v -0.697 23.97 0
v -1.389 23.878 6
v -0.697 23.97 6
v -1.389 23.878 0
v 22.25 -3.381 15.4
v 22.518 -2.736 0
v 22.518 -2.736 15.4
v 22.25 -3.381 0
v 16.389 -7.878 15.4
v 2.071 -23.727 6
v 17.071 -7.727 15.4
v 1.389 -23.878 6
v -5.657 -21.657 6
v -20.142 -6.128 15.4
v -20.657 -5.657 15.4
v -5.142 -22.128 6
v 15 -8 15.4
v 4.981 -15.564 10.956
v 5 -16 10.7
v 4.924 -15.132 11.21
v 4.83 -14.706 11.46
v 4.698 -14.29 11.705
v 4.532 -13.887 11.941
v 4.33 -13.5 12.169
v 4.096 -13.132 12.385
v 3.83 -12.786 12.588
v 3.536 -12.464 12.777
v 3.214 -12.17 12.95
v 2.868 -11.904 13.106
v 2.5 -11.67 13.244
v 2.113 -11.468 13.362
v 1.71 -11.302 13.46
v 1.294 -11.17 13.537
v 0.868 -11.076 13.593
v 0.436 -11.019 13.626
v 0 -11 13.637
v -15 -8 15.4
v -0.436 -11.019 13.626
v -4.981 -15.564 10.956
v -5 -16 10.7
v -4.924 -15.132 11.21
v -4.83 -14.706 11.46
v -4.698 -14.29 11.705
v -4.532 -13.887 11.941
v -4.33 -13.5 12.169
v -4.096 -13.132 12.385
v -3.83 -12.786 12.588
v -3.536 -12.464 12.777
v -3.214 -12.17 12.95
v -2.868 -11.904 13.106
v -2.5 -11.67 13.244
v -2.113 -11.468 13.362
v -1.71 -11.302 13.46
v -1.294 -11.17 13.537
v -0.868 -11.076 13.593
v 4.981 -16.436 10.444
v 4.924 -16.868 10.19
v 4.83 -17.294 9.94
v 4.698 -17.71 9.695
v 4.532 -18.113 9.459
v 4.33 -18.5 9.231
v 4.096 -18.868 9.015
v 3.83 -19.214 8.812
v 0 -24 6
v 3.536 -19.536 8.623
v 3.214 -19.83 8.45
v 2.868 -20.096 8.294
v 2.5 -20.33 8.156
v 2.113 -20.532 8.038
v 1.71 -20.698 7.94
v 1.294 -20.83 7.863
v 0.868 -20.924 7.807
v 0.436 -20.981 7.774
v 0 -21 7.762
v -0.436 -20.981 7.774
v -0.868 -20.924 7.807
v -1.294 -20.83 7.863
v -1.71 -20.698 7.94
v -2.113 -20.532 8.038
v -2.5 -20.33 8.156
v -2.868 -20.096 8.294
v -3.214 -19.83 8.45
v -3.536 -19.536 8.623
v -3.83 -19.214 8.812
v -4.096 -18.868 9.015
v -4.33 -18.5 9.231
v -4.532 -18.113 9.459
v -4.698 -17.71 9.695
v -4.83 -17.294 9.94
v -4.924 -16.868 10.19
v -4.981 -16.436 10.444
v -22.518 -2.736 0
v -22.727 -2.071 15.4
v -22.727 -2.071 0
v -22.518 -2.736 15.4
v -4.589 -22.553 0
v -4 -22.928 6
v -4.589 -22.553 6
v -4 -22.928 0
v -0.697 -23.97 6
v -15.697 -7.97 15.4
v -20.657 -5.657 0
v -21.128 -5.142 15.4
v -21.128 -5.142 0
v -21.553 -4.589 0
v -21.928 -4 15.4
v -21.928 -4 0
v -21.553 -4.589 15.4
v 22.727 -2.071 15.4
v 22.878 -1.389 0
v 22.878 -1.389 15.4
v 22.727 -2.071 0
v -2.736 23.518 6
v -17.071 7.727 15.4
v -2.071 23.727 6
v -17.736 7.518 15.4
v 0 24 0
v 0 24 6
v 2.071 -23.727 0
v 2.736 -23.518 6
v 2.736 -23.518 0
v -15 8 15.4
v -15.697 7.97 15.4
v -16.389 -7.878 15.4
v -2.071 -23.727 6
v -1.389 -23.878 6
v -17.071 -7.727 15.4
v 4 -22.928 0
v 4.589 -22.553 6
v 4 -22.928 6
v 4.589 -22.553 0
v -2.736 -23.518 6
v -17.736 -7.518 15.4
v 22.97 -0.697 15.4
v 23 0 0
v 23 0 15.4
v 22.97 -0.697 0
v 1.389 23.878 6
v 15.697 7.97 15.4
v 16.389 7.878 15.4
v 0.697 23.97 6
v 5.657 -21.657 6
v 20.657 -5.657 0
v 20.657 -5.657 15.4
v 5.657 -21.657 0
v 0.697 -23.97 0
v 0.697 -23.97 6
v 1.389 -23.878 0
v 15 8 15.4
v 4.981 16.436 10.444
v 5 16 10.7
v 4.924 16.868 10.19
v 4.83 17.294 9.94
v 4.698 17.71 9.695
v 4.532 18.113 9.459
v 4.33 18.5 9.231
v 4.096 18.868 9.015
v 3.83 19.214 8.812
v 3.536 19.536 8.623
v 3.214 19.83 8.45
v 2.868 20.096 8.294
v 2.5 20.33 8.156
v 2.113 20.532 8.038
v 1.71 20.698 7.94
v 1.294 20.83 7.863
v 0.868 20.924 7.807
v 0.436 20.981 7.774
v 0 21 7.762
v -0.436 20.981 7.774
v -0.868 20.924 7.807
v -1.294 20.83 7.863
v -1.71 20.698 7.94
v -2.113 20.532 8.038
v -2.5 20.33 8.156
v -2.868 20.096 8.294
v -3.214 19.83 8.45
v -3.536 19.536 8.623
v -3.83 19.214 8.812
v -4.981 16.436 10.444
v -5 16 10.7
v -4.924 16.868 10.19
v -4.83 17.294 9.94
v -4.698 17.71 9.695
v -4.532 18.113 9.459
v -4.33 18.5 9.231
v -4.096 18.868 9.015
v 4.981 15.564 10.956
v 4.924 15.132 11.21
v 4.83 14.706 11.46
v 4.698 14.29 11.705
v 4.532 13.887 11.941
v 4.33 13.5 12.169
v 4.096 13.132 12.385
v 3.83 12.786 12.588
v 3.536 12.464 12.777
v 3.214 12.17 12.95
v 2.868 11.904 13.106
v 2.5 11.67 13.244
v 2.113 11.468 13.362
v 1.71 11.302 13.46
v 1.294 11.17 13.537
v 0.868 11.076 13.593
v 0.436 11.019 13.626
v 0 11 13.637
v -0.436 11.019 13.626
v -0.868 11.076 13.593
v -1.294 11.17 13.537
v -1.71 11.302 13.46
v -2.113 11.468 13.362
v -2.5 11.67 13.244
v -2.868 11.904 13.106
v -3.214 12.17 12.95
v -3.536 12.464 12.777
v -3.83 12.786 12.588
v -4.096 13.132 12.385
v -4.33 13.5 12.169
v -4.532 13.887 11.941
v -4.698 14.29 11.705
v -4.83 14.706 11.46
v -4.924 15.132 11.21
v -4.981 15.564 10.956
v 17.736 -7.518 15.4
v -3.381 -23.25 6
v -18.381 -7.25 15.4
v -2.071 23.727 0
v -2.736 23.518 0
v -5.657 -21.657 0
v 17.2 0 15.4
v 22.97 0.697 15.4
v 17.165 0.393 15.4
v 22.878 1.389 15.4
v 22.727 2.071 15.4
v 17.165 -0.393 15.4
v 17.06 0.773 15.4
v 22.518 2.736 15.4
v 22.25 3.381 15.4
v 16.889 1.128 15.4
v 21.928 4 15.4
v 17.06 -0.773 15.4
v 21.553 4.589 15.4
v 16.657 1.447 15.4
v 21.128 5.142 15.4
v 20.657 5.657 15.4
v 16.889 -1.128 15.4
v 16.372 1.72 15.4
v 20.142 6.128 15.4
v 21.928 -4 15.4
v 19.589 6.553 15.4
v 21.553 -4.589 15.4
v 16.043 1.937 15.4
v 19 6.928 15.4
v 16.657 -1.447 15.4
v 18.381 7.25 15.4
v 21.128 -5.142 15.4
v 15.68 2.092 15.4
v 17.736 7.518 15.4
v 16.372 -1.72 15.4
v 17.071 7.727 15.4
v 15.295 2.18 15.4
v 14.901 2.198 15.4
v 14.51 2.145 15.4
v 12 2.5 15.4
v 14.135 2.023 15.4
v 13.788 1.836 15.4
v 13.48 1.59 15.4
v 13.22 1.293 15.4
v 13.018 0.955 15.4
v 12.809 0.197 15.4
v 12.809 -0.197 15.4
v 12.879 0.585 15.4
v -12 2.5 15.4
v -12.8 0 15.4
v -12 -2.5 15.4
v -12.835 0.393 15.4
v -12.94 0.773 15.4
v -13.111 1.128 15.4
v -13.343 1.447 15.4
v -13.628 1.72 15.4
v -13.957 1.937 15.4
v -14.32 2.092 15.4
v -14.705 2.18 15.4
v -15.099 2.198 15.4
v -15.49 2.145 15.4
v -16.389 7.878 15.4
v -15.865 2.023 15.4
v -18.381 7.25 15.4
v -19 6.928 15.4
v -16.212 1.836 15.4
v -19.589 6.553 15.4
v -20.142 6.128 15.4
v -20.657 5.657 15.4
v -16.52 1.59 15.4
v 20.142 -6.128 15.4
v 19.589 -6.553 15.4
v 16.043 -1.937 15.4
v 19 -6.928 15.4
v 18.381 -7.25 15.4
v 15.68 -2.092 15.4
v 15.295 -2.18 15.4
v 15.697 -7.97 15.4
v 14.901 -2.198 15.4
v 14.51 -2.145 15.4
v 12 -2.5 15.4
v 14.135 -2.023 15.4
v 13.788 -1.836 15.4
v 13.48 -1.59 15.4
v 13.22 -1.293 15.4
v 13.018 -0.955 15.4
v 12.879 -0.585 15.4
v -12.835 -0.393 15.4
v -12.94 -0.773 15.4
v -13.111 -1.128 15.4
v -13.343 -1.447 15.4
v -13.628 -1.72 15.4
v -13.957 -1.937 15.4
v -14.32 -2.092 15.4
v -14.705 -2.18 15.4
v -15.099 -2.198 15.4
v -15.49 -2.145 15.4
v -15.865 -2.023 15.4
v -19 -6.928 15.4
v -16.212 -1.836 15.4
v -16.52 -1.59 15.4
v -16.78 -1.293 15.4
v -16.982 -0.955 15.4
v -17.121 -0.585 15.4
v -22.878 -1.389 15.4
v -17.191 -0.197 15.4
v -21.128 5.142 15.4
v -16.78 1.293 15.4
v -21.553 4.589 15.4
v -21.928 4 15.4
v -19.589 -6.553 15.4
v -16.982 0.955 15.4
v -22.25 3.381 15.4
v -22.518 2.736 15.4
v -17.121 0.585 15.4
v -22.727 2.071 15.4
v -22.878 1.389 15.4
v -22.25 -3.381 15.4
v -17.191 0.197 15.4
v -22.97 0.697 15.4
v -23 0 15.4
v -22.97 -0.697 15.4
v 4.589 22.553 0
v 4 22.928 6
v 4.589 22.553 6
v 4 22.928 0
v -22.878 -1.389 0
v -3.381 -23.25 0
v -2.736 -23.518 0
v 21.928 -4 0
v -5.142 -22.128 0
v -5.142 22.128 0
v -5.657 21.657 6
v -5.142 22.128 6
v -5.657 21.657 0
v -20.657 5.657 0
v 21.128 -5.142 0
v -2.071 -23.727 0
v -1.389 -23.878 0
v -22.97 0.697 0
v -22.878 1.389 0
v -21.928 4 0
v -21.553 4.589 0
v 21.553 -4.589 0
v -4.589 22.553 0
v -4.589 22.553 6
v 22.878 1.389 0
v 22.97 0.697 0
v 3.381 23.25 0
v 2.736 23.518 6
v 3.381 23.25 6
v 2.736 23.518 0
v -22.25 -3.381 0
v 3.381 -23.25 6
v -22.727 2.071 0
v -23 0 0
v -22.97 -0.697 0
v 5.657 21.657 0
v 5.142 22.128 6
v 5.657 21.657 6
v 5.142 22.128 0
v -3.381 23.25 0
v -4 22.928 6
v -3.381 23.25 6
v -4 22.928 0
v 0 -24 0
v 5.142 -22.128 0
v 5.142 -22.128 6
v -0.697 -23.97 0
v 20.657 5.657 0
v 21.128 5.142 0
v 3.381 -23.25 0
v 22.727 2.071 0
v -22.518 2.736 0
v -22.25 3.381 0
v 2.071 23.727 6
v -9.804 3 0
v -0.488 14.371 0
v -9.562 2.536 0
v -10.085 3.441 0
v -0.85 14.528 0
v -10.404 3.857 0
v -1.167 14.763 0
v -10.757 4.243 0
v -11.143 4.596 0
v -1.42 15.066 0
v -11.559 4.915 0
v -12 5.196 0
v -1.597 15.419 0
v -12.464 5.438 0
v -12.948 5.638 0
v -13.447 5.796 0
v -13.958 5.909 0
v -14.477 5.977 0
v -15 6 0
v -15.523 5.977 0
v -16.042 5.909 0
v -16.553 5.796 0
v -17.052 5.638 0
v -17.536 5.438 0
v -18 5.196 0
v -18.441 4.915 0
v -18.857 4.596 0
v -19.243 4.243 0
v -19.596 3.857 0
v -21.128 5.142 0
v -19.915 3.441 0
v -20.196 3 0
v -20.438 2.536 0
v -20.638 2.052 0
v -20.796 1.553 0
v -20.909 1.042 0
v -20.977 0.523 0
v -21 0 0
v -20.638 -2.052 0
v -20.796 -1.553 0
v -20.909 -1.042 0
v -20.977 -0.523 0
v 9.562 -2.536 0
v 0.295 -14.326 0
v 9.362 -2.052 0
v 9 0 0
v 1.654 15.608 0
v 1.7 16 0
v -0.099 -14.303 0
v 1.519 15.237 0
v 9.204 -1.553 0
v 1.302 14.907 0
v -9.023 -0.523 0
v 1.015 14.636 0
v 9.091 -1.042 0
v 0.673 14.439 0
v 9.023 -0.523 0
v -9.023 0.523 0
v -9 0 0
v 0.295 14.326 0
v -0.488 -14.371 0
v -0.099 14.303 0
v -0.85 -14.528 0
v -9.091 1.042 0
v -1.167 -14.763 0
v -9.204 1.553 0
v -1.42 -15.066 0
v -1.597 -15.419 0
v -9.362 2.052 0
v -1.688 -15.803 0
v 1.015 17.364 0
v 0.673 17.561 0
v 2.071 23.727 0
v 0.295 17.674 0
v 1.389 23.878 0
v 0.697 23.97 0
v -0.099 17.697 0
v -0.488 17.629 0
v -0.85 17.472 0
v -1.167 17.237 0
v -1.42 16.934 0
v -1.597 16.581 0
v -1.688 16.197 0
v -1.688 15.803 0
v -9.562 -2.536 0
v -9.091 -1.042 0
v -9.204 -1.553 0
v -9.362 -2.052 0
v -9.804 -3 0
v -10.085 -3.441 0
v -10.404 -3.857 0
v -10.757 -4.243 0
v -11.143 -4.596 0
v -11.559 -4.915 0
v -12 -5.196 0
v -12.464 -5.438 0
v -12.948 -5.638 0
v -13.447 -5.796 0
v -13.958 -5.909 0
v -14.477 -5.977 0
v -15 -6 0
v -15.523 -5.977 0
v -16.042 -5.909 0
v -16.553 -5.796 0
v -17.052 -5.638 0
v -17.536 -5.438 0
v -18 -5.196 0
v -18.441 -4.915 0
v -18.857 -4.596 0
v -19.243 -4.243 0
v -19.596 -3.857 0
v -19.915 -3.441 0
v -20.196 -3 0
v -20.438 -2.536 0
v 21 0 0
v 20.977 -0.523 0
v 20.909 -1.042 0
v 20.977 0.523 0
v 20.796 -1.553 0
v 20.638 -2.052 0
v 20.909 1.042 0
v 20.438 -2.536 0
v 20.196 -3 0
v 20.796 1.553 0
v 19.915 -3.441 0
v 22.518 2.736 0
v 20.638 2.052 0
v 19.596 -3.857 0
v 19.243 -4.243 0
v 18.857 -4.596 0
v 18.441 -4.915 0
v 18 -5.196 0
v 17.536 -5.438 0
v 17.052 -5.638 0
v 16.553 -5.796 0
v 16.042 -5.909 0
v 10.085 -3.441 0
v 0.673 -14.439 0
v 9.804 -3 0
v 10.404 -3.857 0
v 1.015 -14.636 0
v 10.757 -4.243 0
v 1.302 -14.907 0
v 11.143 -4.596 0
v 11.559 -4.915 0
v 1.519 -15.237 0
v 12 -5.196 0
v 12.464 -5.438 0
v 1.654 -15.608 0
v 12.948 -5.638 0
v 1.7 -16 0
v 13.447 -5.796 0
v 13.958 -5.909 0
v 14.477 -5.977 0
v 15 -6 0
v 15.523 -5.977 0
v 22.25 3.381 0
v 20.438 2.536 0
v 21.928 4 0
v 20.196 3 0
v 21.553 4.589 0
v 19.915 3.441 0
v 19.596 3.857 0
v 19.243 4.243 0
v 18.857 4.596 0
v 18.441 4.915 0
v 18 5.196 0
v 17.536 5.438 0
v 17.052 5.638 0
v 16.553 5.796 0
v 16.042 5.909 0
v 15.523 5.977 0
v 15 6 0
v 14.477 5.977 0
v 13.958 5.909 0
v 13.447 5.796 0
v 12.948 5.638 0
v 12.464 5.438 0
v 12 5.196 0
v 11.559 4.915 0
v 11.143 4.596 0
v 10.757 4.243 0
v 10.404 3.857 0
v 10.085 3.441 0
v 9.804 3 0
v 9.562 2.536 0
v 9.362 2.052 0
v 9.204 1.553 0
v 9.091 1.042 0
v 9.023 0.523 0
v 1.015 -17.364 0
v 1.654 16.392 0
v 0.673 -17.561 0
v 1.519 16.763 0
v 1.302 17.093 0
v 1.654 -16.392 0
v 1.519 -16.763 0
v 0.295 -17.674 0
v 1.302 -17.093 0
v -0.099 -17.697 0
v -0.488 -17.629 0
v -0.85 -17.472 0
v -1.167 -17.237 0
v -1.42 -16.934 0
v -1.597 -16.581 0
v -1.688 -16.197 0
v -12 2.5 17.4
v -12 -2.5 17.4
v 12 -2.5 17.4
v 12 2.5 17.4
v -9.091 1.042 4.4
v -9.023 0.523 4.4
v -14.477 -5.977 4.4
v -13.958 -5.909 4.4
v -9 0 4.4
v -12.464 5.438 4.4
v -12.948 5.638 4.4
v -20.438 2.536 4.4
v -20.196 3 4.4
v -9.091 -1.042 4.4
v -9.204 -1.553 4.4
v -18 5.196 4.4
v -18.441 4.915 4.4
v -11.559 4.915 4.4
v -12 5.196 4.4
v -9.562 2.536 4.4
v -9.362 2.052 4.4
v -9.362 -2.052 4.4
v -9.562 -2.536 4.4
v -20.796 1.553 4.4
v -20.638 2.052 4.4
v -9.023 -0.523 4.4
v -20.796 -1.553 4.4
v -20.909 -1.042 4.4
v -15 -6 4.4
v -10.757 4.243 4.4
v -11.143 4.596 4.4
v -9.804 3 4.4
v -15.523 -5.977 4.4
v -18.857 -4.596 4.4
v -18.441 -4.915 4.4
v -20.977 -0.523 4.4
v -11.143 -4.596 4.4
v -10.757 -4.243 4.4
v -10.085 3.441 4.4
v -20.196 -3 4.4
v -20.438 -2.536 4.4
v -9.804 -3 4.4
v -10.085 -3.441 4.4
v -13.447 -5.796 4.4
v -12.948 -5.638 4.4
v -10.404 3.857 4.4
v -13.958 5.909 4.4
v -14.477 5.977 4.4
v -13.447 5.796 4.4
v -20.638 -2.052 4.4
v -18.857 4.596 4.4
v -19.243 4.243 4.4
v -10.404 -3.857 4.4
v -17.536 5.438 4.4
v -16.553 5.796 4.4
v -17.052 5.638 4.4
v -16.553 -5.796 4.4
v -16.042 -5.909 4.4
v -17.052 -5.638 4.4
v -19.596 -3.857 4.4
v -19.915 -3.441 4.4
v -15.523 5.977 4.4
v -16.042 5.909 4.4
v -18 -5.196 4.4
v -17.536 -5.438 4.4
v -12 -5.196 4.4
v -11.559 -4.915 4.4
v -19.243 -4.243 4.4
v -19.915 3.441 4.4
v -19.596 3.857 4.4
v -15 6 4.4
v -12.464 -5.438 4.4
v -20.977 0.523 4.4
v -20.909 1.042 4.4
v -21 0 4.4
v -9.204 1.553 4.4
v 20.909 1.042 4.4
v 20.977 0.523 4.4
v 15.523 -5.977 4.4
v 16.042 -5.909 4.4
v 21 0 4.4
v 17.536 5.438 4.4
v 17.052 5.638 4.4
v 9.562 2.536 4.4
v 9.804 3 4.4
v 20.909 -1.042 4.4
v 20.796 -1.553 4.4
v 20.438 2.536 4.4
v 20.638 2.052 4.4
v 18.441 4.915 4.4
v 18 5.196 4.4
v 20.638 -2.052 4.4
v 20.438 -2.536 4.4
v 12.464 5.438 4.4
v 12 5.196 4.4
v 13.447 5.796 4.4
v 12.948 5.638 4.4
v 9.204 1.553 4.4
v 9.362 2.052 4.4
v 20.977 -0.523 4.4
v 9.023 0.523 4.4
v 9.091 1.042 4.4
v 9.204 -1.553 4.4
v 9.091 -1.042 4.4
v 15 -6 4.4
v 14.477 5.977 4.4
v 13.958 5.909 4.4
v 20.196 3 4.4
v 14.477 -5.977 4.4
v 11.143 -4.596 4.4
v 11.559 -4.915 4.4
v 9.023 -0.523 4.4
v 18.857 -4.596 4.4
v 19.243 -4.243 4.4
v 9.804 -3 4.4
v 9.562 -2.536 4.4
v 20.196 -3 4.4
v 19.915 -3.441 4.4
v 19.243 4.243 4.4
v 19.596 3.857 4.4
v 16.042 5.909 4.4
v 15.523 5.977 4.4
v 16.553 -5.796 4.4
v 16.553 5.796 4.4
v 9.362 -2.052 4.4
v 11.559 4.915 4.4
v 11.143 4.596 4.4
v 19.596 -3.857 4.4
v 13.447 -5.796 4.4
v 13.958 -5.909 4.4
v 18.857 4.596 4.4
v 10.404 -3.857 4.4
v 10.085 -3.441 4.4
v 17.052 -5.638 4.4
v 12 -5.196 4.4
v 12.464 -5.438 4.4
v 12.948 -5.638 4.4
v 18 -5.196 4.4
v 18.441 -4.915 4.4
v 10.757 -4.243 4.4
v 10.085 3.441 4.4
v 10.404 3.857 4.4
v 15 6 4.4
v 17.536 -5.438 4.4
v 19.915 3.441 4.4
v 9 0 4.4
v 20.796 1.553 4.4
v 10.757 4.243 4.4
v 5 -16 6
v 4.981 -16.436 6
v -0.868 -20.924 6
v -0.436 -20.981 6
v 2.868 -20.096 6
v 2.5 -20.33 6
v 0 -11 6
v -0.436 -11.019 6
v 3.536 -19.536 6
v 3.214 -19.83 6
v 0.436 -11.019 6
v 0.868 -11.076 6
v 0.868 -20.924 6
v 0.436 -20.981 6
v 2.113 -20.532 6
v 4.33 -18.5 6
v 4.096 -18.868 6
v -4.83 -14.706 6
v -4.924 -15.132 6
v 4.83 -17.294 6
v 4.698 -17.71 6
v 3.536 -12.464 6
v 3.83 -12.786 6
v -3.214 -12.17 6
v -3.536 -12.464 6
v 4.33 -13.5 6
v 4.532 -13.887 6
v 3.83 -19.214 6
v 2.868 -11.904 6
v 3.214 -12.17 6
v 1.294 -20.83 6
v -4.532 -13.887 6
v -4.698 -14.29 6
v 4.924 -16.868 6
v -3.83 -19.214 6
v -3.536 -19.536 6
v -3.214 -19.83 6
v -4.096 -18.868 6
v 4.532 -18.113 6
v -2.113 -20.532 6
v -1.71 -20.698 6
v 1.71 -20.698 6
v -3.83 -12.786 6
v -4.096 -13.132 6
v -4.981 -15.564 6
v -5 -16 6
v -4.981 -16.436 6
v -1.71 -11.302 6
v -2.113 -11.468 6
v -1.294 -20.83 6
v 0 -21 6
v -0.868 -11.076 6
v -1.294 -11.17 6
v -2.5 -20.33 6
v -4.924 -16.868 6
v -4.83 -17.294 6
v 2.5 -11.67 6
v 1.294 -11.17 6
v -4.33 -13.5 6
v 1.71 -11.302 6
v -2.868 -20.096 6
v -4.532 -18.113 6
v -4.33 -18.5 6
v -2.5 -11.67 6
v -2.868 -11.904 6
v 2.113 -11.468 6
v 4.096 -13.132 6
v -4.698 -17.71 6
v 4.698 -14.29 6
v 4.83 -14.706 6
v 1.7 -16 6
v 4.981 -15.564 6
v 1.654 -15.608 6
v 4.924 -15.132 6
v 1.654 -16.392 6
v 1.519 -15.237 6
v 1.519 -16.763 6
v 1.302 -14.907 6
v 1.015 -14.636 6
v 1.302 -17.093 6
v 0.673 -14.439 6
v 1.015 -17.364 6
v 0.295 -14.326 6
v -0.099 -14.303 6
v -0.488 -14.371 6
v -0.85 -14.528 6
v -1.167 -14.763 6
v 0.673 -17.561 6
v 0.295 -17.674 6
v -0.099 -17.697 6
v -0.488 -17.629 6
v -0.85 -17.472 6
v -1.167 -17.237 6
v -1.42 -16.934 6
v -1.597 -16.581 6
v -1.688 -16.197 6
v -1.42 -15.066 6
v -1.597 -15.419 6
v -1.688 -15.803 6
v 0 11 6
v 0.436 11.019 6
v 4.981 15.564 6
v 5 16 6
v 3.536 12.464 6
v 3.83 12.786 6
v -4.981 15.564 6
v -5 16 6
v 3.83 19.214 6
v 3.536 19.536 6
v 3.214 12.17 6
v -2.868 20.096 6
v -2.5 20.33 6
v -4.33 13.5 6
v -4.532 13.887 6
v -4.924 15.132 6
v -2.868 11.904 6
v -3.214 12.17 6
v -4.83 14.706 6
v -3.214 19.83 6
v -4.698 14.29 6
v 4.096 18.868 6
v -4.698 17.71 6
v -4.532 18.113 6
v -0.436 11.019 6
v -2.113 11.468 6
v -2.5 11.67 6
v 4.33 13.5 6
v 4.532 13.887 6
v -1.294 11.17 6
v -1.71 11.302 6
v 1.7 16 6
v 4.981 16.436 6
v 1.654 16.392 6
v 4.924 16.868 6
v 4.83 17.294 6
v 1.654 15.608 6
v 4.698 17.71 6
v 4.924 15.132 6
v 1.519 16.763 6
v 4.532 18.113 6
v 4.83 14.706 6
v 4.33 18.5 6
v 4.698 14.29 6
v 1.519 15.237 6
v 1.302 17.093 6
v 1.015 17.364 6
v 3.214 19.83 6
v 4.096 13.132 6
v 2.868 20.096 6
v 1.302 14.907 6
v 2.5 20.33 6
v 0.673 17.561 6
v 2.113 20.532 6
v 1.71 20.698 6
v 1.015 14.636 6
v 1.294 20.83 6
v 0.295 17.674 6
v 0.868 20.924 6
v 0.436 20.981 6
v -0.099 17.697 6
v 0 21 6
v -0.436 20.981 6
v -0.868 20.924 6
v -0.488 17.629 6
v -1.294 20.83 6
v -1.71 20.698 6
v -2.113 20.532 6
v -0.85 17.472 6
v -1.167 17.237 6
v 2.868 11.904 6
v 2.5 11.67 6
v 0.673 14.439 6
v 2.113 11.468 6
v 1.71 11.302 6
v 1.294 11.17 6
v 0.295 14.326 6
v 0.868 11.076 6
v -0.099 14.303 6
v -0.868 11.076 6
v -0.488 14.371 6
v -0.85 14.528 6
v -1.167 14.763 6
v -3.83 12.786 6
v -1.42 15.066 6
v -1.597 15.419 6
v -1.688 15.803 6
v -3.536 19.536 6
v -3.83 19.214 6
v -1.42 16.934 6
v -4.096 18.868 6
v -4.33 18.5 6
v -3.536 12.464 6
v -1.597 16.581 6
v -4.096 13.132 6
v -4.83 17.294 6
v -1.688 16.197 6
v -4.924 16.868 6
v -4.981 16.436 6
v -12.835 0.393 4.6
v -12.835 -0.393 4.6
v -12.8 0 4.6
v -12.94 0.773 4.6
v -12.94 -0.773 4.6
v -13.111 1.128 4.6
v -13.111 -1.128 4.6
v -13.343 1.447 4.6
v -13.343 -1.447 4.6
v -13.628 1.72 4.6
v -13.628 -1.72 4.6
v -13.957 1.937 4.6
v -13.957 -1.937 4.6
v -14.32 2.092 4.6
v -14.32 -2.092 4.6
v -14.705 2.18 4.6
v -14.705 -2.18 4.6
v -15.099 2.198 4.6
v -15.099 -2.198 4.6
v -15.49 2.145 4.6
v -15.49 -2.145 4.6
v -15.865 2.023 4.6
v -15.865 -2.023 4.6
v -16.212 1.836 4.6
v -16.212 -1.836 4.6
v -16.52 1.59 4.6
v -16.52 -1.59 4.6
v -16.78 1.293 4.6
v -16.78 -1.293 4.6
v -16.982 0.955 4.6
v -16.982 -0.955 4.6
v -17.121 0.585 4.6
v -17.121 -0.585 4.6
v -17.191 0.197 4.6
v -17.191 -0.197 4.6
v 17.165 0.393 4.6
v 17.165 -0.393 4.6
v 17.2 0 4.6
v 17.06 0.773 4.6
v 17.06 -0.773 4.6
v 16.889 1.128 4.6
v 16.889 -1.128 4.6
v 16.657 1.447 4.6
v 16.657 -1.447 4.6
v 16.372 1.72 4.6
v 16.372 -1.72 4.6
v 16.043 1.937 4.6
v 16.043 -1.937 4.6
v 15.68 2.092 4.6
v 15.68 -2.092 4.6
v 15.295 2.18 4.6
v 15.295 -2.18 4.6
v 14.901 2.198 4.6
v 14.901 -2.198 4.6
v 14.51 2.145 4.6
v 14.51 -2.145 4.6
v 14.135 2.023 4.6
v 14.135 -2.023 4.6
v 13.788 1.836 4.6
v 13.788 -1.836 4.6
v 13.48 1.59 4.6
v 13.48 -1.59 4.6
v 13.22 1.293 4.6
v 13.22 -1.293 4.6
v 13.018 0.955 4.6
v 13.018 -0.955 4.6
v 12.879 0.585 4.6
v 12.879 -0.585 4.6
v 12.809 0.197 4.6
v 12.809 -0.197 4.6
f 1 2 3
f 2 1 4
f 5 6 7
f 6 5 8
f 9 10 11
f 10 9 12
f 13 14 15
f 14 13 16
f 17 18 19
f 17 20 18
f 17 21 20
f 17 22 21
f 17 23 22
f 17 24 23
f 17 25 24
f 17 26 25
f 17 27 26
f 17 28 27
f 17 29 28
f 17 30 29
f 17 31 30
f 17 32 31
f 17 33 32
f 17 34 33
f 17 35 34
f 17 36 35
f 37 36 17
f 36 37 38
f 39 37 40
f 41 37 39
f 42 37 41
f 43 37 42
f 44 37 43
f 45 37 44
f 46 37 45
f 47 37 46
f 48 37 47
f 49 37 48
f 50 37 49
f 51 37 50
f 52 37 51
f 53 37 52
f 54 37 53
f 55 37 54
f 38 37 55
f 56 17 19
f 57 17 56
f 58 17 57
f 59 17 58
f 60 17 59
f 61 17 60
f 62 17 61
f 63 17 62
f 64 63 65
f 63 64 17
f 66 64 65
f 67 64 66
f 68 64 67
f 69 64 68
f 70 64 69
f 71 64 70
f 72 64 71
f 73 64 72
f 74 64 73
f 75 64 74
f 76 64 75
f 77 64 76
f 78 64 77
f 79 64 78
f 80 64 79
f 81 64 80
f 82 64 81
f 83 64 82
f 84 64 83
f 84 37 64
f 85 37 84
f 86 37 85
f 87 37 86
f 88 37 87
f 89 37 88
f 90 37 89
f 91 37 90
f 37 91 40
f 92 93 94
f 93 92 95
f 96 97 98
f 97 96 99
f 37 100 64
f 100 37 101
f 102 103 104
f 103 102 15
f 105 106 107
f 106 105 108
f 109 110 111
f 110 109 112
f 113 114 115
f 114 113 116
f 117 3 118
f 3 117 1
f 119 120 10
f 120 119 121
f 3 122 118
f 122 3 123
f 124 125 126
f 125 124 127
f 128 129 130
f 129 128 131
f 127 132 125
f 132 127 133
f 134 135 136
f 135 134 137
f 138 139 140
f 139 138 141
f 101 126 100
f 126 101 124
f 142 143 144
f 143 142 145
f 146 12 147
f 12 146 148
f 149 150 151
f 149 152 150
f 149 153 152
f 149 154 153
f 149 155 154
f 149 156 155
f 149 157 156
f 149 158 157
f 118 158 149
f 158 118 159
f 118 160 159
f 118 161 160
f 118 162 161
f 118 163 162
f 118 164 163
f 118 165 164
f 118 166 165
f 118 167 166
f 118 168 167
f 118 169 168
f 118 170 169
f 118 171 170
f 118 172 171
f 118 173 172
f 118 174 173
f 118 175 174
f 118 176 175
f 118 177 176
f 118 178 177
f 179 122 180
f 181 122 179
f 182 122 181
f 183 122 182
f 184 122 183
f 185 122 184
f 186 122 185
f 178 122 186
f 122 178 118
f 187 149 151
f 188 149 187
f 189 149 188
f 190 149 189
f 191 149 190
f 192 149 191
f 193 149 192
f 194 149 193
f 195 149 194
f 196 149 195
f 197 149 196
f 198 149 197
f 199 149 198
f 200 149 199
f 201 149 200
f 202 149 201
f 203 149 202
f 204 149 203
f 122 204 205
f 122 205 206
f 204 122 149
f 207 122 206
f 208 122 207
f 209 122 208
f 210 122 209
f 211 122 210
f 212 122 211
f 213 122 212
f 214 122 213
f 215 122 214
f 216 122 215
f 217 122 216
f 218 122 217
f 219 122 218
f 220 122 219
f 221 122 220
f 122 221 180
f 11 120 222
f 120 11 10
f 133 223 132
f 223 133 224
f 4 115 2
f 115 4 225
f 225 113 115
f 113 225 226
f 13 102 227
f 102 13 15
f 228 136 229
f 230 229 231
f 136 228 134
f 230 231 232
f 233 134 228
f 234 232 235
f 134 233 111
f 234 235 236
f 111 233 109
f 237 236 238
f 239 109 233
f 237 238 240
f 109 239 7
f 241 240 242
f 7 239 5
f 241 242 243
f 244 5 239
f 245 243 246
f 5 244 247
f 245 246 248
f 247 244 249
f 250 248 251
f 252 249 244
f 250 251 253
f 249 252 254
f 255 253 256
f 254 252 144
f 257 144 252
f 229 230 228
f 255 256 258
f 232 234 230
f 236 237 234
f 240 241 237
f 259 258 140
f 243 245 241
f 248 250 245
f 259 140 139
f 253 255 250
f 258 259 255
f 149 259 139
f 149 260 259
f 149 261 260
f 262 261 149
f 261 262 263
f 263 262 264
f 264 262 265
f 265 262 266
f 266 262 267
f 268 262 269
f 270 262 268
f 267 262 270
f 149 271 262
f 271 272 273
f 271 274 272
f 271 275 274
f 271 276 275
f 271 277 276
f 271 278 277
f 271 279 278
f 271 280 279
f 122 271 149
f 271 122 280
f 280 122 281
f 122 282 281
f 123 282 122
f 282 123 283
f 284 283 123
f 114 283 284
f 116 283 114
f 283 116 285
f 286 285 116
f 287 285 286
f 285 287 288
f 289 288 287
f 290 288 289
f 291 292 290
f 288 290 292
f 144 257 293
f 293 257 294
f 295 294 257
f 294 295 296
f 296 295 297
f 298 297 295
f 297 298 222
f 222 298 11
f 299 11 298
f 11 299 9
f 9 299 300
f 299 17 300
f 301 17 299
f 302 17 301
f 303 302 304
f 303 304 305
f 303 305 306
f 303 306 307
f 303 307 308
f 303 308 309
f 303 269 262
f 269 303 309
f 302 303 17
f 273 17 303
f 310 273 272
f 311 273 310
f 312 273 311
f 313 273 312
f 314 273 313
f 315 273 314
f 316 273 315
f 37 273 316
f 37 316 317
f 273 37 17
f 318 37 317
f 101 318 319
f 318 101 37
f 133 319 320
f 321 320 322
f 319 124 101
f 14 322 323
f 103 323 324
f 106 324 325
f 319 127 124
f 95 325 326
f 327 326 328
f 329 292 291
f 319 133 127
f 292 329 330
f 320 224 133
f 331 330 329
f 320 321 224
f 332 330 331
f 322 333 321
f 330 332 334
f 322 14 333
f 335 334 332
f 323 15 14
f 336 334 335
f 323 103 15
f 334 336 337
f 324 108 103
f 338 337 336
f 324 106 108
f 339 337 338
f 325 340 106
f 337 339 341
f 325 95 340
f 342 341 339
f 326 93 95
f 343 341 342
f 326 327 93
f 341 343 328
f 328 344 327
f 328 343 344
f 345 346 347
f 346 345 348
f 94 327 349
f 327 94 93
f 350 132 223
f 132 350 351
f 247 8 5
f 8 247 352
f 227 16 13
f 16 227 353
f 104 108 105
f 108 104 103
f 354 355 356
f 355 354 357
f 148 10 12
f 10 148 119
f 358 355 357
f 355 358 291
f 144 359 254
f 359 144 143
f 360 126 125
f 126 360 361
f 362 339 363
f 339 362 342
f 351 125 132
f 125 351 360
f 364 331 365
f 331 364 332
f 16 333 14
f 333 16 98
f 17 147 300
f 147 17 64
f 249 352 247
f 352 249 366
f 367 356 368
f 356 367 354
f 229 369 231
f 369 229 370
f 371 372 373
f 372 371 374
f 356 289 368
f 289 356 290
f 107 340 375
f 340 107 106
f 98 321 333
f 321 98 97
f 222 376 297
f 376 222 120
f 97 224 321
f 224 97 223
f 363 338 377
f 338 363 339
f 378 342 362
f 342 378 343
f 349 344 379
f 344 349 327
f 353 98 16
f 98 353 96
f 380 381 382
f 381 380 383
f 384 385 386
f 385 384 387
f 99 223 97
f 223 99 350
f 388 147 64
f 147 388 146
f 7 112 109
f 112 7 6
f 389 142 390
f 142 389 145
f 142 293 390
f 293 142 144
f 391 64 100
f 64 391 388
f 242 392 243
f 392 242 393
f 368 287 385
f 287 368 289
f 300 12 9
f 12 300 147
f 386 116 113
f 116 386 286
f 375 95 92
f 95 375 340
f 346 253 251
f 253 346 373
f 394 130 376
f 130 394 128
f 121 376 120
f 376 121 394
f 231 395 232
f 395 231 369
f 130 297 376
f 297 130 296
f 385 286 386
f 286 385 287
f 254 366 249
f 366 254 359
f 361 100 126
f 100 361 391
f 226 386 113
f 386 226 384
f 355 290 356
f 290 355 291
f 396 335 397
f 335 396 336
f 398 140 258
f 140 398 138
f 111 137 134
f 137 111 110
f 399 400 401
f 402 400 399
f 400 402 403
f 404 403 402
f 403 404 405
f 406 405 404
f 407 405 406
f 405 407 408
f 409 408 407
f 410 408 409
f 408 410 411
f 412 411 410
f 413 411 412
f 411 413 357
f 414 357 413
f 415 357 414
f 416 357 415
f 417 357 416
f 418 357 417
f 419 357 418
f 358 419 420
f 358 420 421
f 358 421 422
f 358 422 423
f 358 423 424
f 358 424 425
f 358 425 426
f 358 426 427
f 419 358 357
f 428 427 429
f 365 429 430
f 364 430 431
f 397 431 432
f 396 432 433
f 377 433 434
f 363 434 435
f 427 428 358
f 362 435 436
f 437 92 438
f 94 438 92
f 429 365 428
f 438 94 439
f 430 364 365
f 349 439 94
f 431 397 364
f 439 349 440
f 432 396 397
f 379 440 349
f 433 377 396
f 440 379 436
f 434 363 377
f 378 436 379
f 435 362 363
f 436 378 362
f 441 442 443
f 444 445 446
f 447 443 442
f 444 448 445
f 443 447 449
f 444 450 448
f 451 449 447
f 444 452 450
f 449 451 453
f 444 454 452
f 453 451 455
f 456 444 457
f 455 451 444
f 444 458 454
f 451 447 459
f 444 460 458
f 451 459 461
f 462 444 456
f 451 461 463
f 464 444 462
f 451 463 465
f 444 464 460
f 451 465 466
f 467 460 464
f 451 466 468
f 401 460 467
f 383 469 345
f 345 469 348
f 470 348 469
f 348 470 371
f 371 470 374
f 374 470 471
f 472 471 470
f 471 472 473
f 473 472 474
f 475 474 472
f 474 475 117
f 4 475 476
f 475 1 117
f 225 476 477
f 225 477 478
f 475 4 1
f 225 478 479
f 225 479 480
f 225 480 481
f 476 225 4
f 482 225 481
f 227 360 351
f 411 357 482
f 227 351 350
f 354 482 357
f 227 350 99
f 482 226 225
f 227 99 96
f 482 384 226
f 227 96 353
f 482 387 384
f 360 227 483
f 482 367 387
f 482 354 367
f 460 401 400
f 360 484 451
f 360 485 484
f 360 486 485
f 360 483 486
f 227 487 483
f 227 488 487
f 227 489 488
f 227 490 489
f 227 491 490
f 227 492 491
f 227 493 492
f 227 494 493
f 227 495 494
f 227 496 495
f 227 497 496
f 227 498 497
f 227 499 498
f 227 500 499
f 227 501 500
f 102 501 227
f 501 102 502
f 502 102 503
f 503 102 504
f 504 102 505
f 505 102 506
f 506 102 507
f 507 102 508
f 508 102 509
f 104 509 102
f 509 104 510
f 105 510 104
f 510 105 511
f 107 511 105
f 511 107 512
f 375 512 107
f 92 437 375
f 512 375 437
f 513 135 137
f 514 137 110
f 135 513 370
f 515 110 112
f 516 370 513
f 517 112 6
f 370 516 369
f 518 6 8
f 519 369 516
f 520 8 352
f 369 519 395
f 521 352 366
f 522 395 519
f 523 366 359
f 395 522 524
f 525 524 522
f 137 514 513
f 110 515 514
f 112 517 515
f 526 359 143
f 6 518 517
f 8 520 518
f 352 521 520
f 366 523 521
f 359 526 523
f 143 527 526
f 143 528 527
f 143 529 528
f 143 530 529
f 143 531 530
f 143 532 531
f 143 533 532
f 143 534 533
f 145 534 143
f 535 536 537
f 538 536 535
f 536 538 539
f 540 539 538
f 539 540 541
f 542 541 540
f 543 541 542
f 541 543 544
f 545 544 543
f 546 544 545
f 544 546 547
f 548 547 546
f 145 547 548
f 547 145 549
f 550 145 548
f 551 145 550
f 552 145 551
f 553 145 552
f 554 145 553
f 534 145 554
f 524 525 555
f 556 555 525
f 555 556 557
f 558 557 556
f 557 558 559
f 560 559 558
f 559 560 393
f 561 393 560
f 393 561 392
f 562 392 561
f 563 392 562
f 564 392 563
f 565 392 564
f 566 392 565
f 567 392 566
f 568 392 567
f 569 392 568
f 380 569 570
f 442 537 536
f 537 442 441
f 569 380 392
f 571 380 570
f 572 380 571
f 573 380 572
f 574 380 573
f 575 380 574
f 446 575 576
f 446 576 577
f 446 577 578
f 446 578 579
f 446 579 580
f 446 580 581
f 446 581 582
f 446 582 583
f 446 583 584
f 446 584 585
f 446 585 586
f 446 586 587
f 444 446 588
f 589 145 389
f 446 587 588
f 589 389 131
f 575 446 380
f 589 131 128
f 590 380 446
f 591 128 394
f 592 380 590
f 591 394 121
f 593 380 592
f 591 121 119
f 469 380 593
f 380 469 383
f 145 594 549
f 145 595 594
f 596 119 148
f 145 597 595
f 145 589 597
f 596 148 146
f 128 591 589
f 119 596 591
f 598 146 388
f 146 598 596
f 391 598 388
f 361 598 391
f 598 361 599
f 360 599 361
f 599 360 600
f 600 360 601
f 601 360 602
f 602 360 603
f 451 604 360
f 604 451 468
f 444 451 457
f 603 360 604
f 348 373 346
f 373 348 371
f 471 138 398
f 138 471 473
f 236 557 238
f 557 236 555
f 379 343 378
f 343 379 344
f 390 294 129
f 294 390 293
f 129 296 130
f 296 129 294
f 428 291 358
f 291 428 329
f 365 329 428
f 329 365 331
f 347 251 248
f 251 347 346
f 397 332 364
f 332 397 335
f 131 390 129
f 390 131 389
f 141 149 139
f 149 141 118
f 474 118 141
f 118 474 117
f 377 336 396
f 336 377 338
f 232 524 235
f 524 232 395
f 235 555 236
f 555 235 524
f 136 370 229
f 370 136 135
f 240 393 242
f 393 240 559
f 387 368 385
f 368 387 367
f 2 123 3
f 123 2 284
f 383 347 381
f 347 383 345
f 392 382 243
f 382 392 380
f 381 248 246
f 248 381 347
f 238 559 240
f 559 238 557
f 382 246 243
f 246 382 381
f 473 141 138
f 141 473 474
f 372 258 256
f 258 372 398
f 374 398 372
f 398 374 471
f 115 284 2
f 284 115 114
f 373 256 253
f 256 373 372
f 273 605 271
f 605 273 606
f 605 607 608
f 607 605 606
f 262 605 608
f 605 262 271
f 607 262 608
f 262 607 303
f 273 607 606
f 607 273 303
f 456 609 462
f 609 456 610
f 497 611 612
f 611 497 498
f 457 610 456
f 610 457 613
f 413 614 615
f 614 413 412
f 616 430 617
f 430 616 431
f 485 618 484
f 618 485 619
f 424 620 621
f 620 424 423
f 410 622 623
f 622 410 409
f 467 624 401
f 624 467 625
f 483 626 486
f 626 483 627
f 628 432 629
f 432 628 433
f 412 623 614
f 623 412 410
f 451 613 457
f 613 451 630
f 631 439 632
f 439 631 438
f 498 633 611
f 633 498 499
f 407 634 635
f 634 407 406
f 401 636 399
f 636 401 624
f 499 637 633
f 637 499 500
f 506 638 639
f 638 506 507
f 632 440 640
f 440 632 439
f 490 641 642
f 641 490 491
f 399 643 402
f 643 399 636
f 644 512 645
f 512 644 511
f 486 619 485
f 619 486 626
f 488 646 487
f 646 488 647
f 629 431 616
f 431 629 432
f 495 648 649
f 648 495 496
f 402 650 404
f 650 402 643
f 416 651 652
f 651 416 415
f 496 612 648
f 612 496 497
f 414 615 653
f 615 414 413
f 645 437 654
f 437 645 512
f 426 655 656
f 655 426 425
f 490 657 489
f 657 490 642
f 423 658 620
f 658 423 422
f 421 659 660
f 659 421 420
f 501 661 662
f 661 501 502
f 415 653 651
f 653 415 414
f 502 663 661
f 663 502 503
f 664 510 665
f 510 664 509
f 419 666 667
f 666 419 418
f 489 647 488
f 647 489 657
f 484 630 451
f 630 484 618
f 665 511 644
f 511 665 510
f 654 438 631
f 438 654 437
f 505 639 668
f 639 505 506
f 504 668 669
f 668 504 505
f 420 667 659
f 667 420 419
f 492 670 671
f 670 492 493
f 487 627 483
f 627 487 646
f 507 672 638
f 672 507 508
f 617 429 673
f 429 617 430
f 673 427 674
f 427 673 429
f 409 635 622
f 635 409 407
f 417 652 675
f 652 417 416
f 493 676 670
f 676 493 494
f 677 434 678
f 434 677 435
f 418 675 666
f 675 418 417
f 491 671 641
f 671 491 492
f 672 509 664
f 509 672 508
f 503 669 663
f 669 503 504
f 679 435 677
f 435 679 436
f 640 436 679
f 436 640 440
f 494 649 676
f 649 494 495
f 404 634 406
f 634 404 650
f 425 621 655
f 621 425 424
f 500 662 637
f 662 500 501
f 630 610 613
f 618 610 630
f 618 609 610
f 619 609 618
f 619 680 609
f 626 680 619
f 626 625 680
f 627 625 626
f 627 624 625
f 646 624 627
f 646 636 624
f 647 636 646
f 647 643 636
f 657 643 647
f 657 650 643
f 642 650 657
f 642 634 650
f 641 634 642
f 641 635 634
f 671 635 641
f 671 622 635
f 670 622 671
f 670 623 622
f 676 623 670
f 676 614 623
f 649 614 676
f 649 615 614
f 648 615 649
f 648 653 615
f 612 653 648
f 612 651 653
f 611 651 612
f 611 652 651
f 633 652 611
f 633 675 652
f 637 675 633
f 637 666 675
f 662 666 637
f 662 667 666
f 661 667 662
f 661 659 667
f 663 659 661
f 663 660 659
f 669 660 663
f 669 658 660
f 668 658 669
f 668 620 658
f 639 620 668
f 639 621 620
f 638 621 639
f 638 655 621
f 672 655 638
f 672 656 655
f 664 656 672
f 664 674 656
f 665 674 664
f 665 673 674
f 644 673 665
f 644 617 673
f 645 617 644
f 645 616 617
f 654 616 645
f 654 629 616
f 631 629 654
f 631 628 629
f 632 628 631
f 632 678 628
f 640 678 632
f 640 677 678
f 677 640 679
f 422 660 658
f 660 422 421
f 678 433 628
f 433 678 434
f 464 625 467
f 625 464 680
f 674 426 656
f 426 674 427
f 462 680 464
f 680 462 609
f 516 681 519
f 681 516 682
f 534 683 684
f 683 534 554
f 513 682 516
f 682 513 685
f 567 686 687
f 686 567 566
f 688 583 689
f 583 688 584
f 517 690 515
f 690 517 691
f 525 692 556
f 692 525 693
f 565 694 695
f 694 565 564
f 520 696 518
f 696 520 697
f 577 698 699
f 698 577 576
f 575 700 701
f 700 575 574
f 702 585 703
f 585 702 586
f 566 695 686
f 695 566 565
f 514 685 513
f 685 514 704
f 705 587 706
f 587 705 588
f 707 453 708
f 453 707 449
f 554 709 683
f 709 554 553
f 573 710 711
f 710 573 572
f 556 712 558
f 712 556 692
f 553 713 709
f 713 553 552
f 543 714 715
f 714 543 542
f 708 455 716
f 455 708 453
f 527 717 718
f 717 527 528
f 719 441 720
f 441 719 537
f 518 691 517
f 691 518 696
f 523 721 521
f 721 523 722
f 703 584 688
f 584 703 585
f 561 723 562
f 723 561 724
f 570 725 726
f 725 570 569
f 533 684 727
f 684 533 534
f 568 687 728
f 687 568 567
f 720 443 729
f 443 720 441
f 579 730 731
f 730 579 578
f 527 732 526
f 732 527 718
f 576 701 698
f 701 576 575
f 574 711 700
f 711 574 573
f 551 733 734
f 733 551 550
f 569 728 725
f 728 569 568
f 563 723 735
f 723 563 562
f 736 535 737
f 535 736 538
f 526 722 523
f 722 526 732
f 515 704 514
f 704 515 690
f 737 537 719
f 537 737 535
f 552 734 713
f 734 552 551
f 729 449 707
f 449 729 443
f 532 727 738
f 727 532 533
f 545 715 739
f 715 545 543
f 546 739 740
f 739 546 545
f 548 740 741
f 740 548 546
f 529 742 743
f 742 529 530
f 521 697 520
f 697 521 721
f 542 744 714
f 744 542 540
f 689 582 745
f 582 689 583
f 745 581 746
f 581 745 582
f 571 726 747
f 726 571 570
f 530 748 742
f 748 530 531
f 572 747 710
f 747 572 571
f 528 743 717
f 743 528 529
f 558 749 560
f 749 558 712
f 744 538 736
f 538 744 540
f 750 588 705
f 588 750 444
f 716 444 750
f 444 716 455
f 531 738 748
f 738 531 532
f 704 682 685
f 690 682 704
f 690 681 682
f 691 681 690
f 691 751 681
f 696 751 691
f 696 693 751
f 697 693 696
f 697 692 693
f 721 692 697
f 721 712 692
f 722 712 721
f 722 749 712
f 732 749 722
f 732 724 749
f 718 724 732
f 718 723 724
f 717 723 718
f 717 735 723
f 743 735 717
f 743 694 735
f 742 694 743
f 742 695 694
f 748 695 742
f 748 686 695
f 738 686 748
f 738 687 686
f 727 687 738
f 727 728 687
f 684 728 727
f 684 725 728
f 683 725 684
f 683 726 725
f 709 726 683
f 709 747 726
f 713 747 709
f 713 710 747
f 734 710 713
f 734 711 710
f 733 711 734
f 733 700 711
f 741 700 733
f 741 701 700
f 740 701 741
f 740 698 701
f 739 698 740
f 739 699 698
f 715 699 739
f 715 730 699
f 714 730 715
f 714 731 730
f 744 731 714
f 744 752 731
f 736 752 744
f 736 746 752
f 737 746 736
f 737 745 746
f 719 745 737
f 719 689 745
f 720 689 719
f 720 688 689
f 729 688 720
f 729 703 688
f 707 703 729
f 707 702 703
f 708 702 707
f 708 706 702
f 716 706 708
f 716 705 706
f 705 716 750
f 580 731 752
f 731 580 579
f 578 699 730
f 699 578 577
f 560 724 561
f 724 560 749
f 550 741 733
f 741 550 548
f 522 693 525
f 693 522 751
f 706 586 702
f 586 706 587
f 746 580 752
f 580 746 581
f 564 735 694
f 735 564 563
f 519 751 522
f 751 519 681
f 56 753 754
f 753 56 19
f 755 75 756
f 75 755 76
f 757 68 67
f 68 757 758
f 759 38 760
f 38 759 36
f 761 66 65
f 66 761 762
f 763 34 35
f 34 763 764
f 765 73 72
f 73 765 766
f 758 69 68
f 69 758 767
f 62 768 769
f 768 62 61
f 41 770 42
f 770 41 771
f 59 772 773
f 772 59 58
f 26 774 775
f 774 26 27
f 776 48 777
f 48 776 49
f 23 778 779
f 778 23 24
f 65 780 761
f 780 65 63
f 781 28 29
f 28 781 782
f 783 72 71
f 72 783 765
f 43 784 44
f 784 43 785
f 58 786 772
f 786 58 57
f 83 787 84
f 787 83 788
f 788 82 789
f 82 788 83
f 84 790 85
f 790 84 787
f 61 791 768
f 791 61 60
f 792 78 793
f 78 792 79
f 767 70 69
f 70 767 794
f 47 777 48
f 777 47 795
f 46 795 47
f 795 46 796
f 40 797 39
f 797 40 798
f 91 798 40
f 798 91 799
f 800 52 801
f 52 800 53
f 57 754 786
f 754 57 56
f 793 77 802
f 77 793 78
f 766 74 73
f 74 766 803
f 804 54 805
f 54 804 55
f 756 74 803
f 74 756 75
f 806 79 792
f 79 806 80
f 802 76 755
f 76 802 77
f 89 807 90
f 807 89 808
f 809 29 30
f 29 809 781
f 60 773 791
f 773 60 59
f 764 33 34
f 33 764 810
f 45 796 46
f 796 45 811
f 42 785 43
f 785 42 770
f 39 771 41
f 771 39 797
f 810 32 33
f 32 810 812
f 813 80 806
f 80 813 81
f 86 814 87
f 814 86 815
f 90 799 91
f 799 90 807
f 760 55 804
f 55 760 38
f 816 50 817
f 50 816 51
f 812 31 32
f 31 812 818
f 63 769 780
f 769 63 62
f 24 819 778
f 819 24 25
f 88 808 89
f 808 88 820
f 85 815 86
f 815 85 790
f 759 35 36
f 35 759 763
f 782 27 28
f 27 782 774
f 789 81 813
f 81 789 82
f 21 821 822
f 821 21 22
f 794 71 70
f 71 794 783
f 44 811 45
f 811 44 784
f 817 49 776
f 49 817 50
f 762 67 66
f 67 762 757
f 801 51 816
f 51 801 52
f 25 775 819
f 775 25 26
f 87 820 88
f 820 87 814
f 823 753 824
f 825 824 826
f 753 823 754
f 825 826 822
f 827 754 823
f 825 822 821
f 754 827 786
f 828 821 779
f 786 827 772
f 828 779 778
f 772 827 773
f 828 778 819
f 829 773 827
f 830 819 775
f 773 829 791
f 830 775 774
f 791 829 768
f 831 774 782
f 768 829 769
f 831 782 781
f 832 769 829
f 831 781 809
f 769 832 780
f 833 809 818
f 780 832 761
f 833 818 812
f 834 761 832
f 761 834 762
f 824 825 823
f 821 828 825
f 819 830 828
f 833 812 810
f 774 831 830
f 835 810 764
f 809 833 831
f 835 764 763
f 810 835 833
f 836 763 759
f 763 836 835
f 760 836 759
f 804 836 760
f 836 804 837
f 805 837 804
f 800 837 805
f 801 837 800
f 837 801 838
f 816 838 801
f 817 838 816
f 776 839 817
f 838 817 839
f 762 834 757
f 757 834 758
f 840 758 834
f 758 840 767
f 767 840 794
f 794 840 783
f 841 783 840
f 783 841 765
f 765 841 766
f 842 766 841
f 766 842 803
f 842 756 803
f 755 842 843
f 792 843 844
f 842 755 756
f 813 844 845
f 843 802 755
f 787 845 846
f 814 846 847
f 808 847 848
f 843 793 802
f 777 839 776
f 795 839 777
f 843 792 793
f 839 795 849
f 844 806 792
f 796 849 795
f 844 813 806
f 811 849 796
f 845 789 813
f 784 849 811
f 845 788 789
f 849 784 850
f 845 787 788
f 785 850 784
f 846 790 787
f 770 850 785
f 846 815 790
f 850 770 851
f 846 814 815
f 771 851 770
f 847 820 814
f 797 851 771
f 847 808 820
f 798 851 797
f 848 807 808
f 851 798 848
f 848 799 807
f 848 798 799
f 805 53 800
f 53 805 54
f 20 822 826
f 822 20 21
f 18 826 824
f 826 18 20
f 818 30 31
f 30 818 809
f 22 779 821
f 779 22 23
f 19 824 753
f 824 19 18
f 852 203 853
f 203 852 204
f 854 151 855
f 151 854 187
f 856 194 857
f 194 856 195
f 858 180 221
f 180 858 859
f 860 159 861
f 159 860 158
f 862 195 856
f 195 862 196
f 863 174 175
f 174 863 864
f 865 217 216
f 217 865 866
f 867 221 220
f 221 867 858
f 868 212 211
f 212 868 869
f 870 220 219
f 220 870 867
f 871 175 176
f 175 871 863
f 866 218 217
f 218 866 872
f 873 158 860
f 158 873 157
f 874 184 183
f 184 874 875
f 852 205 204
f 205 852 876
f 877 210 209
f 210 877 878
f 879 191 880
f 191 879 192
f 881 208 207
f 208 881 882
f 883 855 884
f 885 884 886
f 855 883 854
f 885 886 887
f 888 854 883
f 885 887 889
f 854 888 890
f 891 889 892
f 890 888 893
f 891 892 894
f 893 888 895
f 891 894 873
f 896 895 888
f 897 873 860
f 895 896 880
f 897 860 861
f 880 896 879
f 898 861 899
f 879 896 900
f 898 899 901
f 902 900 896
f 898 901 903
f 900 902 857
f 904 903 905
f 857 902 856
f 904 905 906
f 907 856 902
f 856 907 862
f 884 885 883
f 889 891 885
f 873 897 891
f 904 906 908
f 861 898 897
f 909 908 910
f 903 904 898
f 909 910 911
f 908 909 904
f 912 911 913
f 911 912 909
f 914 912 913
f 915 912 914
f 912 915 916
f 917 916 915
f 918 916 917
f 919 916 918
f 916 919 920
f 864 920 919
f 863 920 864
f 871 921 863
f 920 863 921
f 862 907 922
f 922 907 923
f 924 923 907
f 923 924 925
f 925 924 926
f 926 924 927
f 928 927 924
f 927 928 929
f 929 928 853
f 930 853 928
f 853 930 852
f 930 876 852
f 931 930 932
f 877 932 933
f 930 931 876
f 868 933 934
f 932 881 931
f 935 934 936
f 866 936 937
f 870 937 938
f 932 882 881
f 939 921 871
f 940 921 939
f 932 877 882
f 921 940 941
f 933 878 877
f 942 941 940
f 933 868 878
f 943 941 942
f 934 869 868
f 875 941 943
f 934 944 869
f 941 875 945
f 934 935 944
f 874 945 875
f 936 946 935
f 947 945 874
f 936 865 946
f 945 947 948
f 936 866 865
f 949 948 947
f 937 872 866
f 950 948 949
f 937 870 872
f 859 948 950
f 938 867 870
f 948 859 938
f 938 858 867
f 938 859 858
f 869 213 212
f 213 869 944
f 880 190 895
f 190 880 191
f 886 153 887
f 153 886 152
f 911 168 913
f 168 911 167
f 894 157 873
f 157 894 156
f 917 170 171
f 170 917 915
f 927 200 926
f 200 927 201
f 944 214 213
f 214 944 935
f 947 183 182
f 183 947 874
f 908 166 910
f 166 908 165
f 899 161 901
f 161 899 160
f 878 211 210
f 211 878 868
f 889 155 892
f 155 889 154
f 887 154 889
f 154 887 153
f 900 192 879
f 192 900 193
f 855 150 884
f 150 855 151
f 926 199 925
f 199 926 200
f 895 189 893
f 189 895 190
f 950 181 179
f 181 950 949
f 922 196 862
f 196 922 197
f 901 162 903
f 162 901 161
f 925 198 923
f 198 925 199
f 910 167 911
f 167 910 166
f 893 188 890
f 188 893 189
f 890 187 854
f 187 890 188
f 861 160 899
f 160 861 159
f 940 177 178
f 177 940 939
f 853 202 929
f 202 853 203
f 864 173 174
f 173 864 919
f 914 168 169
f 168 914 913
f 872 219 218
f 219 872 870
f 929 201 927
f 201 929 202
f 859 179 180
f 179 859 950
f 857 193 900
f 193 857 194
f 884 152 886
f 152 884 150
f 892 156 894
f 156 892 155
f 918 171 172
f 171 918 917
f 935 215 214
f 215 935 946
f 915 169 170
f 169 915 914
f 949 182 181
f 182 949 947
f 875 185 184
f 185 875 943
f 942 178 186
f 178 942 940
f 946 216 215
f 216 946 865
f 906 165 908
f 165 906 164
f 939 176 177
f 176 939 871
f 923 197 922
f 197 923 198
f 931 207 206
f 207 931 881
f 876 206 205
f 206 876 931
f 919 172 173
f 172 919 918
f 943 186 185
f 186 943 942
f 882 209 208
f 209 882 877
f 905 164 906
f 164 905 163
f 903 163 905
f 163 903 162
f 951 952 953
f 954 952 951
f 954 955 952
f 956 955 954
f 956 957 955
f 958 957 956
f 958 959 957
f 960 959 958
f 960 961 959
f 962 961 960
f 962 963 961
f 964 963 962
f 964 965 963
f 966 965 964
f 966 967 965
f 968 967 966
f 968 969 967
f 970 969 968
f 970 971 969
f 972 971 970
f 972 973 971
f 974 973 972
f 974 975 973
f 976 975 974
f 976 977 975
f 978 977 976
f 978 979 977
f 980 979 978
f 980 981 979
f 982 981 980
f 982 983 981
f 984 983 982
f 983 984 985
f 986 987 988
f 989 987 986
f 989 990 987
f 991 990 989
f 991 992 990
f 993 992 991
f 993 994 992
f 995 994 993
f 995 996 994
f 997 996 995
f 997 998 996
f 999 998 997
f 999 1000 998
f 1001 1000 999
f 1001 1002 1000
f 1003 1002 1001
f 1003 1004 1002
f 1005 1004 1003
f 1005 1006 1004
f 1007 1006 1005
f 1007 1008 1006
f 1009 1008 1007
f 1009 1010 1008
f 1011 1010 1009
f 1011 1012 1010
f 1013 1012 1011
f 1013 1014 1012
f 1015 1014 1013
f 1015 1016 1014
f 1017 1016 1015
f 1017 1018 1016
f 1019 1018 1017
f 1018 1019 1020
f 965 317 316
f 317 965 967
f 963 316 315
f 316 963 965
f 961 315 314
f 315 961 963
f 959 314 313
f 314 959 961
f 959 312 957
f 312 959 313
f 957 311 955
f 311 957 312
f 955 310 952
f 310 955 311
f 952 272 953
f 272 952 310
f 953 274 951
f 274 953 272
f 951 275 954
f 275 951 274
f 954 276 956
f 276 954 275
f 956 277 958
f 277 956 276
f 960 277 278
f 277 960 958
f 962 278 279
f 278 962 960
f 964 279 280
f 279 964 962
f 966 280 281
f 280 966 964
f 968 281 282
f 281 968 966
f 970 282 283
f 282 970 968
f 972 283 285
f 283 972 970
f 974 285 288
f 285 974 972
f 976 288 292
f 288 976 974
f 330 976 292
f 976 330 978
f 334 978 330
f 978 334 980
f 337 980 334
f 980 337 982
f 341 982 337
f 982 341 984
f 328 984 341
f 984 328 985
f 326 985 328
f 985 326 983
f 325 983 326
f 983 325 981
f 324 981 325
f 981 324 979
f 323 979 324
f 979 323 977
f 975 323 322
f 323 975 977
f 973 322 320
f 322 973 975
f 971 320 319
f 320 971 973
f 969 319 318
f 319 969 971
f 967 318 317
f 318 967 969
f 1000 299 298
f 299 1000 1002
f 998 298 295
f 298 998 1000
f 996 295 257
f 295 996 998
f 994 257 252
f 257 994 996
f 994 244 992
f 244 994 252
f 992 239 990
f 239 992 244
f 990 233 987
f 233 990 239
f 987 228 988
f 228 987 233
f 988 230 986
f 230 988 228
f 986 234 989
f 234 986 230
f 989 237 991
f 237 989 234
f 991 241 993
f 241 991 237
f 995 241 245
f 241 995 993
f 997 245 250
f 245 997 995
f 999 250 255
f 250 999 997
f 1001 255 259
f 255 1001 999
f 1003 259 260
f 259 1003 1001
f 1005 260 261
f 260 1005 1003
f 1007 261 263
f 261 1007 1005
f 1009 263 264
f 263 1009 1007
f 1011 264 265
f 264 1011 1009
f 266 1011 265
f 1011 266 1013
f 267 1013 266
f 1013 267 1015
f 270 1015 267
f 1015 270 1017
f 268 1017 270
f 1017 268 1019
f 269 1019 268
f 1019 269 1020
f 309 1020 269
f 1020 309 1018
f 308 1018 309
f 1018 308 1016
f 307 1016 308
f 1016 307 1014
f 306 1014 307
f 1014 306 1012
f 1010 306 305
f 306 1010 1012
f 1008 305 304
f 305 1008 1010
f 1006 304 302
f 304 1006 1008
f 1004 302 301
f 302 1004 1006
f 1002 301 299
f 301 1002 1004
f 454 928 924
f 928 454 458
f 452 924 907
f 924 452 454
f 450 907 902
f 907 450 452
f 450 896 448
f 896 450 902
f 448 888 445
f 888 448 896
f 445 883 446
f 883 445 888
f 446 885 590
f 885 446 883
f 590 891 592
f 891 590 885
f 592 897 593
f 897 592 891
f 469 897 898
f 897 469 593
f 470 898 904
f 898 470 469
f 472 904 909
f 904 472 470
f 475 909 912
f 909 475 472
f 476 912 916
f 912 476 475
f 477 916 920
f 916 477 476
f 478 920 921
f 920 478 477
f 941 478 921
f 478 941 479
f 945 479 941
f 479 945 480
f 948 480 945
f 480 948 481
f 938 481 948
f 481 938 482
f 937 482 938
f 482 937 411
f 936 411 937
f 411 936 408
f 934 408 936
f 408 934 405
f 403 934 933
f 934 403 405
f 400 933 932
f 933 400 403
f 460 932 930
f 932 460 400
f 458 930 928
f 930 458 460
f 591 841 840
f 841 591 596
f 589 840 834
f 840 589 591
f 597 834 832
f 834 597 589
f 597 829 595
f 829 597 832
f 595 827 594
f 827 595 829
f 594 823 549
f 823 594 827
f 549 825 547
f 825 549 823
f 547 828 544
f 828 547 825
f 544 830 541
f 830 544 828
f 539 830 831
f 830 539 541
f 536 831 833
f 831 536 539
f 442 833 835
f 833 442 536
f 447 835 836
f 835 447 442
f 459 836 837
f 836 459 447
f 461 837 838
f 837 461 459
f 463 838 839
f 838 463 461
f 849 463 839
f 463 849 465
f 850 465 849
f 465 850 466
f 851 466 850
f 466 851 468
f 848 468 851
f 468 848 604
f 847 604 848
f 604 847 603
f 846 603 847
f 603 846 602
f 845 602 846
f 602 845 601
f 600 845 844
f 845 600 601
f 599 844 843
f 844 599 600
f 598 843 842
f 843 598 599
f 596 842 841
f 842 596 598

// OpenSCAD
//$fn=60;
$fa=5;
$fs=.4;


difference(){
    body_all();
    mounting_holes();
}

module body_all(){
    difference(){
        body();
        cutoff();
    }
}

module mounting_holes(){
    translate([0,0,4.6]) linear_extrude(height=20){
        translate([-15,0,0]) circle(d=4.4);
        translate([15,0,0]) circle(d=4.4);
    }
    translate([0,0,-1]) linear_extrude(height=30){
        translate([0,-16,0]) circle(d=3.4);
        translate([0,16,0]) circle(d=3.4);
    }
}

module body(){
    hull(){
        translate([0,0,11+4.2]) linear_extrude(height=0.2) hull(){
            translate([-15,0,0]) circle(d=16);
            translate([15,0,0]) circle(d=16);
        }
        
        linear_extrude(height=6) hull(){
            translate([-15,0,0]) circle(d=16);
            translate([15,0,0]) circle(d=16);
            translate([0,-16,0]) circle(d=16);
            translate([0,16,0]) circle(d=16);
        }
    }
    translate([0,0,11+4.4]) linear_extrude(height=2) square([24,5],center=true);
}

module cutoff(){
     translate([-15,0,-0.2]) linear_extrude(height=4.6) circle(d=12);
     translate([15,0,-0.2]) linear_extrude(height=4.6) circle(d=12);

     translate([0,-16,6]) linear_extrude(height=10) circle(d=10);
     translate([0,16,6]) linear_extrude(height=10) circle(d=10);
}
